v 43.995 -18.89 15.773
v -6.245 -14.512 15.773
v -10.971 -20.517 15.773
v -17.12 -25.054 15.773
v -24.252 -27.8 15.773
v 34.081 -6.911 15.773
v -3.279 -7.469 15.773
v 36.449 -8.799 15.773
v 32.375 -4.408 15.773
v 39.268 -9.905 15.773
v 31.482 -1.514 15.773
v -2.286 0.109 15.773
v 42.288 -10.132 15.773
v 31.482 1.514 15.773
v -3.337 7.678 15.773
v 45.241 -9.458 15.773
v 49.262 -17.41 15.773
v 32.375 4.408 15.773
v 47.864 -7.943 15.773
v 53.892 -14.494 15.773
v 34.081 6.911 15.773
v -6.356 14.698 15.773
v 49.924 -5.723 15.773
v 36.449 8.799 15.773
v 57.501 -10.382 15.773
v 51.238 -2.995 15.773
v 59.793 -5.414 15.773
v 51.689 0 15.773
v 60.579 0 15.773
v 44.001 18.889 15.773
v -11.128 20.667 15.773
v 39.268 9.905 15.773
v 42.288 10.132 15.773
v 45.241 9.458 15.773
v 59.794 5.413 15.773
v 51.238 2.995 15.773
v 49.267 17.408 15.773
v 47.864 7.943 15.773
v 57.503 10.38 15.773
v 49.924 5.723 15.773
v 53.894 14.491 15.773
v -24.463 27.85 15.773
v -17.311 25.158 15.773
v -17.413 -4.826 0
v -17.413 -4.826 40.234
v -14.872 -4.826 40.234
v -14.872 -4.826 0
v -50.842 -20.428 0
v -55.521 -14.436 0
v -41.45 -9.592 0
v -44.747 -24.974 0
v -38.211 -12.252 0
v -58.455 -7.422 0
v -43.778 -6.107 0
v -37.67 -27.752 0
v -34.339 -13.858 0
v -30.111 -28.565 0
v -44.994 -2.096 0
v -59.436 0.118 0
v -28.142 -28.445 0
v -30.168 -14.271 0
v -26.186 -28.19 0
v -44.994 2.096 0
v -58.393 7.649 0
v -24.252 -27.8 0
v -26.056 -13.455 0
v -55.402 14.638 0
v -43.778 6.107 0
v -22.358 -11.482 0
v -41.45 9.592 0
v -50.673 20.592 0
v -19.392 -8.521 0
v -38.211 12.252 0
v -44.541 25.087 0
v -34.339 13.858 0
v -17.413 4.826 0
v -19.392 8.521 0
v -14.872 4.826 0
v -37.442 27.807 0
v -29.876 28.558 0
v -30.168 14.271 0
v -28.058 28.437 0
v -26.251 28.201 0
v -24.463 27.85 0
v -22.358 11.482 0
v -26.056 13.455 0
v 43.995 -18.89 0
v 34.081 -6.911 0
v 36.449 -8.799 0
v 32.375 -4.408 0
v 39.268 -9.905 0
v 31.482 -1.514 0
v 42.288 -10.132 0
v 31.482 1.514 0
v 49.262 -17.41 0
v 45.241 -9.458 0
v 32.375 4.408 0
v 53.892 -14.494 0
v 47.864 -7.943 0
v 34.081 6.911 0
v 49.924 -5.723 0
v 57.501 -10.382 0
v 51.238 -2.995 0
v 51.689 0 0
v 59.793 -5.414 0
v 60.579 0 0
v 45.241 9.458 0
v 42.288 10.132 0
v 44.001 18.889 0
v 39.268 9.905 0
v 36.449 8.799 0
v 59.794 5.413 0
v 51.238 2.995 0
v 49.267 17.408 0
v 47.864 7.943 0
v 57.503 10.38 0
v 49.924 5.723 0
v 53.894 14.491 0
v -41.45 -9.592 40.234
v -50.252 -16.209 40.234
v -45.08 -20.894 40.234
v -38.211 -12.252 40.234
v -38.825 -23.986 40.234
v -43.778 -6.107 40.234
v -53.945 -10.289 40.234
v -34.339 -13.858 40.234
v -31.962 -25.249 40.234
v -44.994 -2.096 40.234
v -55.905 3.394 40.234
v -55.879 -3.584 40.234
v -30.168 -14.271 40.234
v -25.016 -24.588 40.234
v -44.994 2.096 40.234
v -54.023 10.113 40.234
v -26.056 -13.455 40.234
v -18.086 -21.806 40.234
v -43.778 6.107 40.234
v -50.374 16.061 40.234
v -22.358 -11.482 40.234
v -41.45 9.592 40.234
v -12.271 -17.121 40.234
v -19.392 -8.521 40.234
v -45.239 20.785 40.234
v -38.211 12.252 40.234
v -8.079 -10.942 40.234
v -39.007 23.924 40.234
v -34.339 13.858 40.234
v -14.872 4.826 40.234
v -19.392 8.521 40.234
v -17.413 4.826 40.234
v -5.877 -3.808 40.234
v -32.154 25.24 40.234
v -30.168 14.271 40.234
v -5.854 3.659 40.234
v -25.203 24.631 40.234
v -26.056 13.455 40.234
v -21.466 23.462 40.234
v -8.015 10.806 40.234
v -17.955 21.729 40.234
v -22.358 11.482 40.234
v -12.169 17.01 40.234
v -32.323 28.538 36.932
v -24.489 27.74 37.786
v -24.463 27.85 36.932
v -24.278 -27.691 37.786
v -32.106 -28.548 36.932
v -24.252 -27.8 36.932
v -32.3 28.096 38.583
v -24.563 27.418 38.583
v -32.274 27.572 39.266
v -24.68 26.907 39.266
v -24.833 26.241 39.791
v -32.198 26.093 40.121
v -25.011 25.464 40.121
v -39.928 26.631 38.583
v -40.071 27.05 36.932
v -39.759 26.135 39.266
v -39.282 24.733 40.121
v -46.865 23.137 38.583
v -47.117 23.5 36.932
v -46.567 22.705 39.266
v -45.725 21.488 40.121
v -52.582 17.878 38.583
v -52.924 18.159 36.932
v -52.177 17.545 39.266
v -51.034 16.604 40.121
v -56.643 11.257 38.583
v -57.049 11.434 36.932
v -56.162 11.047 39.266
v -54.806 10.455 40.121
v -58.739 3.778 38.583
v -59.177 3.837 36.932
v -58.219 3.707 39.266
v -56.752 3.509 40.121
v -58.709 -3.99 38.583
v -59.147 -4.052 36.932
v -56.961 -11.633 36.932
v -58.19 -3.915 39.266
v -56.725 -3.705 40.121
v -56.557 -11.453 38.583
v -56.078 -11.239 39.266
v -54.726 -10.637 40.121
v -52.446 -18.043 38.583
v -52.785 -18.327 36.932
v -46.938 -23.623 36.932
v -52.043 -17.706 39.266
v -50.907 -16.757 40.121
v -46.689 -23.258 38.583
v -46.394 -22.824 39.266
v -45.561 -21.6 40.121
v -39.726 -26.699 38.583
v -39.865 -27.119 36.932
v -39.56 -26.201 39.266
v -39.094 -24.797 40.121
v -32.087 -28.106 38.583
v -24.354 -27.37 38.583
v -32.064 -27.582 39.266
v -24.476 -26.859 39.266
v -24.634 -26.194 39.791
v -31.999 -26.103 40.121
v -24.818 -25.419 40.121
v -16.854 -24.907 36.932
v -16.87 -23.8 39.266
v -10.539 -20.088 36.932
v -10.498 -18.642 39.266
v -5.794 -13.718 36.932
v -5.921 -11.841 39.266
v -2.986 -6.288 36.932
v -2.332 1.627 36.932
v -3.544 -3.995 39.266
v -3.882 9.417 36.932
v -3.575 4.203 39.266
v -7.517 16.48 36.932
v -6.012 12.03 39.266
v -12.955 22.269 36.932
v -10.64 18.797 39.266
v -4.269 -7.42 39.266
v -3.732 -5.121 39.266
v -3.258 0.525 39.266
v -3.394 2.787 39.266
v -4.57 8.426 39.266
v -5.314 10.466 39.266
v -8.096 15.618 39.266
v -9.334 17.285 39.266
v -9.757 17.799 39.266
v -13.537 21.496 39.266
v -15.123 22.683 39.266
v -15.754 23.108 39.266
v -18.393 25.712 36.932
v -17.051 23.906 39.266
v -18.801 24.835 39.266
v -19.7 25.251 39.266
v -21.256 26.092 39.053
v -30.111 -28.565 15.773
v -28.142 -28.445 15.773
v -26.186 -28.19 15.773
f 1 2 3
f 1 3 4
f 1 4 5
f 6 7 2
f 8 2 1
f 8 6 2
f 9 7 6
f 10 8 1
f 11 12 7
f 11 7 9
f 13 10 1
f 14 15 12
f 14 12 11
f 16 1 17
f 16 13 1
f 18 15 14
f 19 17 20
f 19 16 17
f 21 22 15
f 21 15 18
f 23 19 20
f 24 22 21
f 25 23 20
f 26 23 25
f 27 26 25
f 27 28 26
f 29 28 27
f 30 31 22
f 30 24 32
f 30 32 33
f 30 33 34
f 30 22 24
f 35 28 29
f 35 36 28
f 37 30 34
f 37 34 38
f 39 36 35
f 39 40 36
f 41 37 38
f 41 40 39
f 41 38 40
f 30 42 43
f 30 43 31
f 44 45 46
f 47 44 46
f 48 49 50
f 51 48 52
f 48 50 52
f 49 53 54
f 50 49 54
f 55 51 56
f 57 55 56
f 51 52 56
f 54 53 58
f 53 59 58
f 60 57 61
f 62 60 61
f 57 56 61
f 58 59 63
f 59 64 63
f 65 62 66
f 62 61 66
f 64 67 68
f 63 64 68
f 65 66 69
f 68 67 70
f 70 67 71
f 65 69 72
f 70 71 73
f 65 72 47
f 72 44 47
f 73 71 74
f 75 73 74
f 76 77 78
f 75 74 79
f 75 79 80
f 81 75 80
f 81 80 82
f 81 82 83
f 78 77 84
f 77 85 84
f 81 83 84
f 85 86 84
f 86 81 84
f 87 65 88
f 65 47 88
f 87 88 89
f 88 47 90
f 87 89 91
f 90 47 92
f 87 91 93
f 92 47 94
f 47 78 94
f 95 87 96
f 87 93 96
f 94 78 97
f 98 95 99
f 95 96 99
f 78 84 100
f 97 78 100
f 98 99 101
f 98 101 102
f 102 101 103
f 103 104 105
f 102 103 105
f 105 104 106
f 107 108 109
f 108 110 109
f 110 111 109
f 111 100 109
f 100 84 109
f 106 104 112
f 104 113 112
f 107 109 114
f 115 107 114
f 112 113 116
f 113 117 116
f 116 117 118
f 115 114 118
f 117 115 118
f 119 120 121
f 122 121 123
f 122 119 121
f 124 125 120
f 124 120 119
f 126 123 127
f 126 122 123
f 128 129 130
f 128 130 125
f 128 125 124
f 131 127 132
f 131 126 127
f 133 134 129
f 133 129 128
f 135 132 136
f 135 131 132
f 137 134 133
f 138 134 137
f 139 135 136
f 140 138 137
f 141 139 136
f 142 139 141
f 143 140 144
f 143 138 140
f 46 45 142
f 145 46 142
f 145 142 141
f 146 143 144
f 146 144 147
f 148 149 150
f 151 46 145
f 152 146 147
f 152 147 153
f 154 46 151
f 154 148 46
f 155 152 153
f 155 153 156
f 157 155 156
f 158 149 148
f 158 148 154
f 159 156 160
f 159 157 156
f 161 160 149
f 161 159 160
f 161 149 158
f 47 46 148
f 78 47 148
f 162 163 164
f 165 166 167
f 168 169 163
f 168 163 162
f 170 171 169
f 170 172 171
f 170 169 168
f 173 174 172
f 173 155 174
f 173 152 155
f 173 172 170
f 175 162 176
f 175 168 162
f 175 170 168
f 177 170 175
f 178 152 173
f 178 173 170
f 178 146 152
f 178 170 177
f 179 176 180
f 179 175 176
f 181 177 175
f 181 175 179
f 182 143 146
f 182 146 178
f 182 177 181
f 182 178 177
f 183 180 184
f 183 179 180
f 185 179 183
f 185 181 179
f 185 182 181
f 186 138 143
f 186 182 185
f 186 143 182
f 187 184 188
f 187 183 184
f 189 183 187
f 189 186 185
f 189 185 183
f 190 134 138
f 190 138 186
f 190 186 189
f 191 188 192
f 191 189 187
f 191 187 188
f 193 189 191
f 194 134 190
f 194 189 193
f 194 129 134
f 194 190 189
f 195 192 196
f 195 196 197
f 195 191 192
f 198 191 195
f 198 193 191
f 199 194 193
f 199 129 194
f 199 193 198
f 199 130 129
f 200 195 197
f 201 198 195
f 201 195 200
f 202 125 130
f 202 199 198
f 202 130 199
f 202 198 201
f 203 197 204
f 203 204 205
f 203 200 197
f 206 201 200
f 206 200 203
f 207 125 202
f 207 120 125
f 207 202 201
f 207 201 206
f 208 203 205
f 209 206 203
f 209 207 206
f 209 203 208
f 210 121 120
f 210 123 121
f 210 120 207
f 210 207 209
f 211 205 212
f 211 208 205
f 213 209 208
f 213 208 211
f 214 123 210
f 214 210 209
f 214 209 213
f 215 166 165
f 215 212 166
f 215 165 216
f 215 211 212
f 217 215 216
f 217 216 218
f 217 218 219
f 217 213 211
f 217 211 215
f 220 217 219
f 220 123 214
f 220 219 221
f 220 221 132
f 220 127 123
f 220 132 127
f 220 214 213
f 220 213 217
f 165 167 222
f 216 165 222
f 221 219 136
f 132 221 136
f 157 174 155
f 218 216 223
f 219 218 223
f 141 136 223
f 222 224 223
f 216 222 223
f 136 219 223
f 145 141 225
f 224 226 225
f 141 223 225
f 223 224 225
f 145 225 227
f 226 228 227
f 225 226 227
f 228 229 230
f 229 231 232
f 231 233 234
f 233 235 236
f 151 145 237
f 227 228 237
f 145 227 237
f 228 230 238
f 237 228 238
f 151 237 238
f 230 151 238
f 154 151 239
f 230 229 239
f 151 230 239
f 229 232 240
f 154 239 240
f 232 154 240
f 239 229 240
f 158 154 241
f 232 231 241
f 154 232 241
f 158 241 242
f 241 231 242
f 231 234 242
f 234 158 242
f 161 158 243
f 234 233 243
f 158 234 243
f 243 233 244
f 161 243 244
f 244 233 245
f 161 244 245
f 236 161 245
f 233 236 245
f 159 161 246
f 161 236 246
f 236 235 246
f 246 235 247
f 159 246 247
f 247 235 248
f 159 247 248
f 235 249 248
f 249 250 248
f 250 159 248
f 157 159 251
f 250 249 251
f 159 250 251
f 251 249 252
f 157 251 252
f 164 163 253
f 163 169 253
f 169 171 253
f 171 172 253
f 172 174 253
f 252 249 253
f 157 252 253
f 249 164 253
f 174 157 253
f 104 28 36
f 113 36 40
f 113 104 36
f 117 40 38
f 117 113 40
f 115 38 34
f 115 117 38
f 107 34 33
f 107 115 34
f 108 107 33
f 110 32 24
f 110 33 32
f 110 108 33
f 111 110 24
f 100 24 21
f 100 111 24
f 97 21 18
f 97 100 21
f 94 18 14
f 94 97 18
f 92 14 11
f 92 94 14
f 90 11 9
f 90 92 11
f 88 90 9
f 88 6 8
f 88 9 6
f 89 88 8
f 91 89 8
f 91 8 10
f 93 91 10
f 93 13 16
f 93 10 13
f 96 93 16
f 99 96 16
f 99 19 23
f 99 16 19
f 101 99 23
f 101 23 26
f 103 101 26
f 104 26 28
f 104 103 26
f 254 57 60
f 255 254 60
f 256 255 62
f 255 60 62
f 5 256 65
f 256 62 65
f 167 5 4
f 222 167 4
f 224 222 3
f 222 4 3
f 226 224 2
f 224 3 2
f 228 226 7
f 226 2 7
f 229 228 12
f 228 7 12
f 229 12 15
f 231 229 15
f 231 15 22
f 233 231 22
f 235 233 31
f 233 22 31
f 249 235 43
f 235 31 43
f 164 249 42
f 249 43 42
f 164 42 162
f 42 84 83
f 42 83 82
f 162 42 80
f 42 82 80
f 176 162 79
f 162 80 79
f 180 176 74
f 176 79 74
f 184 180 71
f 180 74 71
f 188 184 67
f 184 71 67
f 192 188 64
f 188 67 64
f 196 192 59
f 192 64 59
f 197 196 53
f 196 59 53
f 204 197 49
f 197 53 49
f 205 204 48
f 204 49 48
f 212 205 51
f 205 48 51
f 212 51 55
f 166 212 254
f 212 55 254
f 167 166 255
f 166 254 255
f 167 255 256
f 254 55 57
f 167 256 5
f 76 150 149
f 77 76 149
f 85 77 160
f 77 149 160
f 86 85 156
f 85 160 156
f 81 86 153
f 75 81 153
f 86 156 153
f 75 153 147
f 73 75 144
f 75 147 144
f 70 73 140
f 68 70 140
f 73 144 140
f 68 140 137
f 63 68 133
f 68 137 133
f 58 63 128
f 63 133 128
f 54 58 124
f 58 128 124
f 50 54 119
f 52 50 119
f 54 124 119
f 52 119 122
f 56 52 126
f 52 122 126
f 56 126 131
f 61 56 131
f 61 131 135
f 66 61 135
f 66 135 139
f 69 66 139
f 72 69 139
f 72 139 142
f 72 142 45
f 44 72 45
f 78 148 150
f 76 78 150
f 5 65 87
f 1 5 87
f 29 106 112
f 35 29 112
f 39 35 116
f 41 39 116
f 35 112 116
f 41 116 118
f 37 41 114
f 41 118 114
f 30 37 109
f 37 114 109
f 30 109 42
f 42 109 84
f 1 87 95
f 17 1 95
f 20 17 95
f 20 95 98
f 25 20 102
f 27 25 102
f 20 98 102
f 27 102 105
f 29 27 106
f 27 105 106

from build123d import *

# Parameters (mm, degrees)
F1_DEPTH = 15.7734
F3_DEPTH = 40.2336
F4_R     = 3.302
F5_R     = 10.16
F6_DEPTH = 40.2346
F8_DEPTH = 40.2346


with BuildPart() as f1:
    # F0 (on Top) → F1 (new body)
    with BuildSketch(Plane.XY):
        with BuildLine():
            ThreePointArc((43.9952853306, -18.8896787473), (55.8448206349, -12.5682112257), (60.5790053739, 0))
            ThreePointArc((60.5790053739, 0), (55.8467902665, 12.565967363), (44.001206343, 18.8889047424))
            ThreePointArc((44.001206343, 18.8889047424), (22.4790056079, 0.0029856939), (43.9952853306, -18.8896787473))
        make_face()
        with BuildLine():
            ThreePointArc((43.9952853306, -18.8896787473), (22.4790056079, 0.0029856939), (44.001206343, 18.8889047424))
            Line((44.001206343, 18.8889047424), (-24.4634996727, 27.8496420043))
            ThreePointArc((-24.4634996727, 27.8496420043), (-8.5077123635, 17.8005889057), (-2.2860042823, 0))
            ThreePointArc((-2.2860042823, 0), (-8.4401964439, -17.7154734872), (-24.2519186042, -27.8001908536))
            Line((-24.2519186042, -27.8001908536), (43.9952853306, -18.8896787473))
        make_face()
        with BuildLine():
            Line((-29.8758121402, 28.5580115107), (-24.4634996727, 27.8496420043))
            ThreePointArc((-24.4634996727, 27.8496420043), (-27.1527028286, 28.3333571136), (-29.8758121402, 28.5580115107))
        make_face()
        with BuildLine():
            ThreePointArc((-2.2860042823, 0), (-8.5077123635, 17.8005889057), (-24.4634996727, 27.8496420043))
            Line((-24.4634996727, 27.8496420043), (-29.8758121402, 28.5580115107))
            ThreePointArc((-29.8758121402, 28.5580115107), (-59.4357622966, 0.1175985837), (-30.110900859, -28.565153069))
            Line((-30.110900859, -28.565153069), (-24.2519186042, -27.8001908536))
            ThreePointArc((-24.2519186042, -27.8001908536), (-8.4401964439, -17.7154734872), (-2.2860042823, 0))
        make_face()
        with BuildLine():
            ThreePointArc((-30.110900859, -28.565153069), (-27.1615843473, -28.3345181209), (-24.2519186042, -27.8001908536))
            Line((-24.2519186042, -27.8001908536), (-30.110900859, -28.565153069))
        make_face()
    extrude(amount=F1_DEPTH)

    # F2 (on Top) → F3 (join)
    with BuildSketch(Plane.XY):
        with BuildLine():
            ThreePointArc((-2.2860042823, 0), (-8.5077123635, 17.8005889057), (-24.4634996727, 27.8496420043))
            ThreePointArc((-24.4634996727, 27.8496420043), (-59.435797755, -0.1086415722), (-24.2519186042, -27.8001908536))
            ThreePointArc((-24.2519186042, -27.8001908536), (-8.4401964439, -17.7154734872), (-2.2860042823, 0))
        make_face()
    extrude(amount=F3_DEPTH)

    # F4
    f4_edges = [f1.edges().sort_by_distance(p)[0] for p in [
        (-37.47009, 27.800191, 40.2336),
    ]]
    fillet(f4_edges, radius=F4_R)

    # F5 (on Top) → F6 (cut, through all)
    with BuildSketch(Plane.XY):
        with Locations((41.5290053739, 0)):
            Circle(F5_R)
    extrude(amount=F6_DEPTH, mode=Mode.SUBTRACT)

    # F7 (on face) → F8 (cut, through all)
    with BuildSketch(Plane.XY.offset(40.2336)):
        with BuildLine():
            ThreePointArc((-17.413239403, -4.826), (-16.7850034837, -2.4492565746), (-16.5735042823, 0))
            ThreePointArc((-16.5735042823, 0), (-16.7850034837, 2.4492565746), (-17.413239403, 4.826))
            ThreePointArc((-17.413239403, 4.826), (-45.1485042823, 0), (-17.413239403, -4.826))
        make_face()
        with BuildLine():
            ThreePointArc((-17.413239403, 4.826), (-16.7850034837, 2.4492565746), (-16.5735042823, 0))
            ThreePointArc((-16.5735042823, 0), (-16.7850034837, -2.4492565746), (-17.413239403, -4.826))
            Line((-17.413239403, -4.826), (-14.8717042823, -4.826))
            Line((-14.8717042823, -4.826), (-14.8717042823, 4.826))
            Line((-14.8717042823, 4.826), (-17.413239403, 4.826))
        make_face()
    extrude(amount=-F8_DEPTH, mode=Mode.SUBTRACT)


solid = f1.part
